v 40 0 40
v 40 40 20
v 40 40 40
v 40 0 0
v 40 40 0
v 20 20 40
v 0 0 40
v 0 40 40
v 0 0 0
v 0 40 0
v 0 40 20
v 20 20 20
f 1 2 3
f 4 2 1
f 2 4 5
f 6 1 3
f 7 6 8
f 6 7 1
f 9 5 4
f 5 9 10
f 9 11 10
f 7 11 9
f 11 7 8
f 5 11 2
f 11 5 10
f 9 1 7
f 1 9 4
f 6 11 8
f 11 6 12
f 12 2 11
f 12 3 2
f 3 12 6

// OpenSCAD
difference(){
cube([40, 40, 40], center=false);
translate([20, 20, 20]){
rotate([0, 0, 45]){
{
cube([40, 40, 20], center=false);
}
}
}
}
